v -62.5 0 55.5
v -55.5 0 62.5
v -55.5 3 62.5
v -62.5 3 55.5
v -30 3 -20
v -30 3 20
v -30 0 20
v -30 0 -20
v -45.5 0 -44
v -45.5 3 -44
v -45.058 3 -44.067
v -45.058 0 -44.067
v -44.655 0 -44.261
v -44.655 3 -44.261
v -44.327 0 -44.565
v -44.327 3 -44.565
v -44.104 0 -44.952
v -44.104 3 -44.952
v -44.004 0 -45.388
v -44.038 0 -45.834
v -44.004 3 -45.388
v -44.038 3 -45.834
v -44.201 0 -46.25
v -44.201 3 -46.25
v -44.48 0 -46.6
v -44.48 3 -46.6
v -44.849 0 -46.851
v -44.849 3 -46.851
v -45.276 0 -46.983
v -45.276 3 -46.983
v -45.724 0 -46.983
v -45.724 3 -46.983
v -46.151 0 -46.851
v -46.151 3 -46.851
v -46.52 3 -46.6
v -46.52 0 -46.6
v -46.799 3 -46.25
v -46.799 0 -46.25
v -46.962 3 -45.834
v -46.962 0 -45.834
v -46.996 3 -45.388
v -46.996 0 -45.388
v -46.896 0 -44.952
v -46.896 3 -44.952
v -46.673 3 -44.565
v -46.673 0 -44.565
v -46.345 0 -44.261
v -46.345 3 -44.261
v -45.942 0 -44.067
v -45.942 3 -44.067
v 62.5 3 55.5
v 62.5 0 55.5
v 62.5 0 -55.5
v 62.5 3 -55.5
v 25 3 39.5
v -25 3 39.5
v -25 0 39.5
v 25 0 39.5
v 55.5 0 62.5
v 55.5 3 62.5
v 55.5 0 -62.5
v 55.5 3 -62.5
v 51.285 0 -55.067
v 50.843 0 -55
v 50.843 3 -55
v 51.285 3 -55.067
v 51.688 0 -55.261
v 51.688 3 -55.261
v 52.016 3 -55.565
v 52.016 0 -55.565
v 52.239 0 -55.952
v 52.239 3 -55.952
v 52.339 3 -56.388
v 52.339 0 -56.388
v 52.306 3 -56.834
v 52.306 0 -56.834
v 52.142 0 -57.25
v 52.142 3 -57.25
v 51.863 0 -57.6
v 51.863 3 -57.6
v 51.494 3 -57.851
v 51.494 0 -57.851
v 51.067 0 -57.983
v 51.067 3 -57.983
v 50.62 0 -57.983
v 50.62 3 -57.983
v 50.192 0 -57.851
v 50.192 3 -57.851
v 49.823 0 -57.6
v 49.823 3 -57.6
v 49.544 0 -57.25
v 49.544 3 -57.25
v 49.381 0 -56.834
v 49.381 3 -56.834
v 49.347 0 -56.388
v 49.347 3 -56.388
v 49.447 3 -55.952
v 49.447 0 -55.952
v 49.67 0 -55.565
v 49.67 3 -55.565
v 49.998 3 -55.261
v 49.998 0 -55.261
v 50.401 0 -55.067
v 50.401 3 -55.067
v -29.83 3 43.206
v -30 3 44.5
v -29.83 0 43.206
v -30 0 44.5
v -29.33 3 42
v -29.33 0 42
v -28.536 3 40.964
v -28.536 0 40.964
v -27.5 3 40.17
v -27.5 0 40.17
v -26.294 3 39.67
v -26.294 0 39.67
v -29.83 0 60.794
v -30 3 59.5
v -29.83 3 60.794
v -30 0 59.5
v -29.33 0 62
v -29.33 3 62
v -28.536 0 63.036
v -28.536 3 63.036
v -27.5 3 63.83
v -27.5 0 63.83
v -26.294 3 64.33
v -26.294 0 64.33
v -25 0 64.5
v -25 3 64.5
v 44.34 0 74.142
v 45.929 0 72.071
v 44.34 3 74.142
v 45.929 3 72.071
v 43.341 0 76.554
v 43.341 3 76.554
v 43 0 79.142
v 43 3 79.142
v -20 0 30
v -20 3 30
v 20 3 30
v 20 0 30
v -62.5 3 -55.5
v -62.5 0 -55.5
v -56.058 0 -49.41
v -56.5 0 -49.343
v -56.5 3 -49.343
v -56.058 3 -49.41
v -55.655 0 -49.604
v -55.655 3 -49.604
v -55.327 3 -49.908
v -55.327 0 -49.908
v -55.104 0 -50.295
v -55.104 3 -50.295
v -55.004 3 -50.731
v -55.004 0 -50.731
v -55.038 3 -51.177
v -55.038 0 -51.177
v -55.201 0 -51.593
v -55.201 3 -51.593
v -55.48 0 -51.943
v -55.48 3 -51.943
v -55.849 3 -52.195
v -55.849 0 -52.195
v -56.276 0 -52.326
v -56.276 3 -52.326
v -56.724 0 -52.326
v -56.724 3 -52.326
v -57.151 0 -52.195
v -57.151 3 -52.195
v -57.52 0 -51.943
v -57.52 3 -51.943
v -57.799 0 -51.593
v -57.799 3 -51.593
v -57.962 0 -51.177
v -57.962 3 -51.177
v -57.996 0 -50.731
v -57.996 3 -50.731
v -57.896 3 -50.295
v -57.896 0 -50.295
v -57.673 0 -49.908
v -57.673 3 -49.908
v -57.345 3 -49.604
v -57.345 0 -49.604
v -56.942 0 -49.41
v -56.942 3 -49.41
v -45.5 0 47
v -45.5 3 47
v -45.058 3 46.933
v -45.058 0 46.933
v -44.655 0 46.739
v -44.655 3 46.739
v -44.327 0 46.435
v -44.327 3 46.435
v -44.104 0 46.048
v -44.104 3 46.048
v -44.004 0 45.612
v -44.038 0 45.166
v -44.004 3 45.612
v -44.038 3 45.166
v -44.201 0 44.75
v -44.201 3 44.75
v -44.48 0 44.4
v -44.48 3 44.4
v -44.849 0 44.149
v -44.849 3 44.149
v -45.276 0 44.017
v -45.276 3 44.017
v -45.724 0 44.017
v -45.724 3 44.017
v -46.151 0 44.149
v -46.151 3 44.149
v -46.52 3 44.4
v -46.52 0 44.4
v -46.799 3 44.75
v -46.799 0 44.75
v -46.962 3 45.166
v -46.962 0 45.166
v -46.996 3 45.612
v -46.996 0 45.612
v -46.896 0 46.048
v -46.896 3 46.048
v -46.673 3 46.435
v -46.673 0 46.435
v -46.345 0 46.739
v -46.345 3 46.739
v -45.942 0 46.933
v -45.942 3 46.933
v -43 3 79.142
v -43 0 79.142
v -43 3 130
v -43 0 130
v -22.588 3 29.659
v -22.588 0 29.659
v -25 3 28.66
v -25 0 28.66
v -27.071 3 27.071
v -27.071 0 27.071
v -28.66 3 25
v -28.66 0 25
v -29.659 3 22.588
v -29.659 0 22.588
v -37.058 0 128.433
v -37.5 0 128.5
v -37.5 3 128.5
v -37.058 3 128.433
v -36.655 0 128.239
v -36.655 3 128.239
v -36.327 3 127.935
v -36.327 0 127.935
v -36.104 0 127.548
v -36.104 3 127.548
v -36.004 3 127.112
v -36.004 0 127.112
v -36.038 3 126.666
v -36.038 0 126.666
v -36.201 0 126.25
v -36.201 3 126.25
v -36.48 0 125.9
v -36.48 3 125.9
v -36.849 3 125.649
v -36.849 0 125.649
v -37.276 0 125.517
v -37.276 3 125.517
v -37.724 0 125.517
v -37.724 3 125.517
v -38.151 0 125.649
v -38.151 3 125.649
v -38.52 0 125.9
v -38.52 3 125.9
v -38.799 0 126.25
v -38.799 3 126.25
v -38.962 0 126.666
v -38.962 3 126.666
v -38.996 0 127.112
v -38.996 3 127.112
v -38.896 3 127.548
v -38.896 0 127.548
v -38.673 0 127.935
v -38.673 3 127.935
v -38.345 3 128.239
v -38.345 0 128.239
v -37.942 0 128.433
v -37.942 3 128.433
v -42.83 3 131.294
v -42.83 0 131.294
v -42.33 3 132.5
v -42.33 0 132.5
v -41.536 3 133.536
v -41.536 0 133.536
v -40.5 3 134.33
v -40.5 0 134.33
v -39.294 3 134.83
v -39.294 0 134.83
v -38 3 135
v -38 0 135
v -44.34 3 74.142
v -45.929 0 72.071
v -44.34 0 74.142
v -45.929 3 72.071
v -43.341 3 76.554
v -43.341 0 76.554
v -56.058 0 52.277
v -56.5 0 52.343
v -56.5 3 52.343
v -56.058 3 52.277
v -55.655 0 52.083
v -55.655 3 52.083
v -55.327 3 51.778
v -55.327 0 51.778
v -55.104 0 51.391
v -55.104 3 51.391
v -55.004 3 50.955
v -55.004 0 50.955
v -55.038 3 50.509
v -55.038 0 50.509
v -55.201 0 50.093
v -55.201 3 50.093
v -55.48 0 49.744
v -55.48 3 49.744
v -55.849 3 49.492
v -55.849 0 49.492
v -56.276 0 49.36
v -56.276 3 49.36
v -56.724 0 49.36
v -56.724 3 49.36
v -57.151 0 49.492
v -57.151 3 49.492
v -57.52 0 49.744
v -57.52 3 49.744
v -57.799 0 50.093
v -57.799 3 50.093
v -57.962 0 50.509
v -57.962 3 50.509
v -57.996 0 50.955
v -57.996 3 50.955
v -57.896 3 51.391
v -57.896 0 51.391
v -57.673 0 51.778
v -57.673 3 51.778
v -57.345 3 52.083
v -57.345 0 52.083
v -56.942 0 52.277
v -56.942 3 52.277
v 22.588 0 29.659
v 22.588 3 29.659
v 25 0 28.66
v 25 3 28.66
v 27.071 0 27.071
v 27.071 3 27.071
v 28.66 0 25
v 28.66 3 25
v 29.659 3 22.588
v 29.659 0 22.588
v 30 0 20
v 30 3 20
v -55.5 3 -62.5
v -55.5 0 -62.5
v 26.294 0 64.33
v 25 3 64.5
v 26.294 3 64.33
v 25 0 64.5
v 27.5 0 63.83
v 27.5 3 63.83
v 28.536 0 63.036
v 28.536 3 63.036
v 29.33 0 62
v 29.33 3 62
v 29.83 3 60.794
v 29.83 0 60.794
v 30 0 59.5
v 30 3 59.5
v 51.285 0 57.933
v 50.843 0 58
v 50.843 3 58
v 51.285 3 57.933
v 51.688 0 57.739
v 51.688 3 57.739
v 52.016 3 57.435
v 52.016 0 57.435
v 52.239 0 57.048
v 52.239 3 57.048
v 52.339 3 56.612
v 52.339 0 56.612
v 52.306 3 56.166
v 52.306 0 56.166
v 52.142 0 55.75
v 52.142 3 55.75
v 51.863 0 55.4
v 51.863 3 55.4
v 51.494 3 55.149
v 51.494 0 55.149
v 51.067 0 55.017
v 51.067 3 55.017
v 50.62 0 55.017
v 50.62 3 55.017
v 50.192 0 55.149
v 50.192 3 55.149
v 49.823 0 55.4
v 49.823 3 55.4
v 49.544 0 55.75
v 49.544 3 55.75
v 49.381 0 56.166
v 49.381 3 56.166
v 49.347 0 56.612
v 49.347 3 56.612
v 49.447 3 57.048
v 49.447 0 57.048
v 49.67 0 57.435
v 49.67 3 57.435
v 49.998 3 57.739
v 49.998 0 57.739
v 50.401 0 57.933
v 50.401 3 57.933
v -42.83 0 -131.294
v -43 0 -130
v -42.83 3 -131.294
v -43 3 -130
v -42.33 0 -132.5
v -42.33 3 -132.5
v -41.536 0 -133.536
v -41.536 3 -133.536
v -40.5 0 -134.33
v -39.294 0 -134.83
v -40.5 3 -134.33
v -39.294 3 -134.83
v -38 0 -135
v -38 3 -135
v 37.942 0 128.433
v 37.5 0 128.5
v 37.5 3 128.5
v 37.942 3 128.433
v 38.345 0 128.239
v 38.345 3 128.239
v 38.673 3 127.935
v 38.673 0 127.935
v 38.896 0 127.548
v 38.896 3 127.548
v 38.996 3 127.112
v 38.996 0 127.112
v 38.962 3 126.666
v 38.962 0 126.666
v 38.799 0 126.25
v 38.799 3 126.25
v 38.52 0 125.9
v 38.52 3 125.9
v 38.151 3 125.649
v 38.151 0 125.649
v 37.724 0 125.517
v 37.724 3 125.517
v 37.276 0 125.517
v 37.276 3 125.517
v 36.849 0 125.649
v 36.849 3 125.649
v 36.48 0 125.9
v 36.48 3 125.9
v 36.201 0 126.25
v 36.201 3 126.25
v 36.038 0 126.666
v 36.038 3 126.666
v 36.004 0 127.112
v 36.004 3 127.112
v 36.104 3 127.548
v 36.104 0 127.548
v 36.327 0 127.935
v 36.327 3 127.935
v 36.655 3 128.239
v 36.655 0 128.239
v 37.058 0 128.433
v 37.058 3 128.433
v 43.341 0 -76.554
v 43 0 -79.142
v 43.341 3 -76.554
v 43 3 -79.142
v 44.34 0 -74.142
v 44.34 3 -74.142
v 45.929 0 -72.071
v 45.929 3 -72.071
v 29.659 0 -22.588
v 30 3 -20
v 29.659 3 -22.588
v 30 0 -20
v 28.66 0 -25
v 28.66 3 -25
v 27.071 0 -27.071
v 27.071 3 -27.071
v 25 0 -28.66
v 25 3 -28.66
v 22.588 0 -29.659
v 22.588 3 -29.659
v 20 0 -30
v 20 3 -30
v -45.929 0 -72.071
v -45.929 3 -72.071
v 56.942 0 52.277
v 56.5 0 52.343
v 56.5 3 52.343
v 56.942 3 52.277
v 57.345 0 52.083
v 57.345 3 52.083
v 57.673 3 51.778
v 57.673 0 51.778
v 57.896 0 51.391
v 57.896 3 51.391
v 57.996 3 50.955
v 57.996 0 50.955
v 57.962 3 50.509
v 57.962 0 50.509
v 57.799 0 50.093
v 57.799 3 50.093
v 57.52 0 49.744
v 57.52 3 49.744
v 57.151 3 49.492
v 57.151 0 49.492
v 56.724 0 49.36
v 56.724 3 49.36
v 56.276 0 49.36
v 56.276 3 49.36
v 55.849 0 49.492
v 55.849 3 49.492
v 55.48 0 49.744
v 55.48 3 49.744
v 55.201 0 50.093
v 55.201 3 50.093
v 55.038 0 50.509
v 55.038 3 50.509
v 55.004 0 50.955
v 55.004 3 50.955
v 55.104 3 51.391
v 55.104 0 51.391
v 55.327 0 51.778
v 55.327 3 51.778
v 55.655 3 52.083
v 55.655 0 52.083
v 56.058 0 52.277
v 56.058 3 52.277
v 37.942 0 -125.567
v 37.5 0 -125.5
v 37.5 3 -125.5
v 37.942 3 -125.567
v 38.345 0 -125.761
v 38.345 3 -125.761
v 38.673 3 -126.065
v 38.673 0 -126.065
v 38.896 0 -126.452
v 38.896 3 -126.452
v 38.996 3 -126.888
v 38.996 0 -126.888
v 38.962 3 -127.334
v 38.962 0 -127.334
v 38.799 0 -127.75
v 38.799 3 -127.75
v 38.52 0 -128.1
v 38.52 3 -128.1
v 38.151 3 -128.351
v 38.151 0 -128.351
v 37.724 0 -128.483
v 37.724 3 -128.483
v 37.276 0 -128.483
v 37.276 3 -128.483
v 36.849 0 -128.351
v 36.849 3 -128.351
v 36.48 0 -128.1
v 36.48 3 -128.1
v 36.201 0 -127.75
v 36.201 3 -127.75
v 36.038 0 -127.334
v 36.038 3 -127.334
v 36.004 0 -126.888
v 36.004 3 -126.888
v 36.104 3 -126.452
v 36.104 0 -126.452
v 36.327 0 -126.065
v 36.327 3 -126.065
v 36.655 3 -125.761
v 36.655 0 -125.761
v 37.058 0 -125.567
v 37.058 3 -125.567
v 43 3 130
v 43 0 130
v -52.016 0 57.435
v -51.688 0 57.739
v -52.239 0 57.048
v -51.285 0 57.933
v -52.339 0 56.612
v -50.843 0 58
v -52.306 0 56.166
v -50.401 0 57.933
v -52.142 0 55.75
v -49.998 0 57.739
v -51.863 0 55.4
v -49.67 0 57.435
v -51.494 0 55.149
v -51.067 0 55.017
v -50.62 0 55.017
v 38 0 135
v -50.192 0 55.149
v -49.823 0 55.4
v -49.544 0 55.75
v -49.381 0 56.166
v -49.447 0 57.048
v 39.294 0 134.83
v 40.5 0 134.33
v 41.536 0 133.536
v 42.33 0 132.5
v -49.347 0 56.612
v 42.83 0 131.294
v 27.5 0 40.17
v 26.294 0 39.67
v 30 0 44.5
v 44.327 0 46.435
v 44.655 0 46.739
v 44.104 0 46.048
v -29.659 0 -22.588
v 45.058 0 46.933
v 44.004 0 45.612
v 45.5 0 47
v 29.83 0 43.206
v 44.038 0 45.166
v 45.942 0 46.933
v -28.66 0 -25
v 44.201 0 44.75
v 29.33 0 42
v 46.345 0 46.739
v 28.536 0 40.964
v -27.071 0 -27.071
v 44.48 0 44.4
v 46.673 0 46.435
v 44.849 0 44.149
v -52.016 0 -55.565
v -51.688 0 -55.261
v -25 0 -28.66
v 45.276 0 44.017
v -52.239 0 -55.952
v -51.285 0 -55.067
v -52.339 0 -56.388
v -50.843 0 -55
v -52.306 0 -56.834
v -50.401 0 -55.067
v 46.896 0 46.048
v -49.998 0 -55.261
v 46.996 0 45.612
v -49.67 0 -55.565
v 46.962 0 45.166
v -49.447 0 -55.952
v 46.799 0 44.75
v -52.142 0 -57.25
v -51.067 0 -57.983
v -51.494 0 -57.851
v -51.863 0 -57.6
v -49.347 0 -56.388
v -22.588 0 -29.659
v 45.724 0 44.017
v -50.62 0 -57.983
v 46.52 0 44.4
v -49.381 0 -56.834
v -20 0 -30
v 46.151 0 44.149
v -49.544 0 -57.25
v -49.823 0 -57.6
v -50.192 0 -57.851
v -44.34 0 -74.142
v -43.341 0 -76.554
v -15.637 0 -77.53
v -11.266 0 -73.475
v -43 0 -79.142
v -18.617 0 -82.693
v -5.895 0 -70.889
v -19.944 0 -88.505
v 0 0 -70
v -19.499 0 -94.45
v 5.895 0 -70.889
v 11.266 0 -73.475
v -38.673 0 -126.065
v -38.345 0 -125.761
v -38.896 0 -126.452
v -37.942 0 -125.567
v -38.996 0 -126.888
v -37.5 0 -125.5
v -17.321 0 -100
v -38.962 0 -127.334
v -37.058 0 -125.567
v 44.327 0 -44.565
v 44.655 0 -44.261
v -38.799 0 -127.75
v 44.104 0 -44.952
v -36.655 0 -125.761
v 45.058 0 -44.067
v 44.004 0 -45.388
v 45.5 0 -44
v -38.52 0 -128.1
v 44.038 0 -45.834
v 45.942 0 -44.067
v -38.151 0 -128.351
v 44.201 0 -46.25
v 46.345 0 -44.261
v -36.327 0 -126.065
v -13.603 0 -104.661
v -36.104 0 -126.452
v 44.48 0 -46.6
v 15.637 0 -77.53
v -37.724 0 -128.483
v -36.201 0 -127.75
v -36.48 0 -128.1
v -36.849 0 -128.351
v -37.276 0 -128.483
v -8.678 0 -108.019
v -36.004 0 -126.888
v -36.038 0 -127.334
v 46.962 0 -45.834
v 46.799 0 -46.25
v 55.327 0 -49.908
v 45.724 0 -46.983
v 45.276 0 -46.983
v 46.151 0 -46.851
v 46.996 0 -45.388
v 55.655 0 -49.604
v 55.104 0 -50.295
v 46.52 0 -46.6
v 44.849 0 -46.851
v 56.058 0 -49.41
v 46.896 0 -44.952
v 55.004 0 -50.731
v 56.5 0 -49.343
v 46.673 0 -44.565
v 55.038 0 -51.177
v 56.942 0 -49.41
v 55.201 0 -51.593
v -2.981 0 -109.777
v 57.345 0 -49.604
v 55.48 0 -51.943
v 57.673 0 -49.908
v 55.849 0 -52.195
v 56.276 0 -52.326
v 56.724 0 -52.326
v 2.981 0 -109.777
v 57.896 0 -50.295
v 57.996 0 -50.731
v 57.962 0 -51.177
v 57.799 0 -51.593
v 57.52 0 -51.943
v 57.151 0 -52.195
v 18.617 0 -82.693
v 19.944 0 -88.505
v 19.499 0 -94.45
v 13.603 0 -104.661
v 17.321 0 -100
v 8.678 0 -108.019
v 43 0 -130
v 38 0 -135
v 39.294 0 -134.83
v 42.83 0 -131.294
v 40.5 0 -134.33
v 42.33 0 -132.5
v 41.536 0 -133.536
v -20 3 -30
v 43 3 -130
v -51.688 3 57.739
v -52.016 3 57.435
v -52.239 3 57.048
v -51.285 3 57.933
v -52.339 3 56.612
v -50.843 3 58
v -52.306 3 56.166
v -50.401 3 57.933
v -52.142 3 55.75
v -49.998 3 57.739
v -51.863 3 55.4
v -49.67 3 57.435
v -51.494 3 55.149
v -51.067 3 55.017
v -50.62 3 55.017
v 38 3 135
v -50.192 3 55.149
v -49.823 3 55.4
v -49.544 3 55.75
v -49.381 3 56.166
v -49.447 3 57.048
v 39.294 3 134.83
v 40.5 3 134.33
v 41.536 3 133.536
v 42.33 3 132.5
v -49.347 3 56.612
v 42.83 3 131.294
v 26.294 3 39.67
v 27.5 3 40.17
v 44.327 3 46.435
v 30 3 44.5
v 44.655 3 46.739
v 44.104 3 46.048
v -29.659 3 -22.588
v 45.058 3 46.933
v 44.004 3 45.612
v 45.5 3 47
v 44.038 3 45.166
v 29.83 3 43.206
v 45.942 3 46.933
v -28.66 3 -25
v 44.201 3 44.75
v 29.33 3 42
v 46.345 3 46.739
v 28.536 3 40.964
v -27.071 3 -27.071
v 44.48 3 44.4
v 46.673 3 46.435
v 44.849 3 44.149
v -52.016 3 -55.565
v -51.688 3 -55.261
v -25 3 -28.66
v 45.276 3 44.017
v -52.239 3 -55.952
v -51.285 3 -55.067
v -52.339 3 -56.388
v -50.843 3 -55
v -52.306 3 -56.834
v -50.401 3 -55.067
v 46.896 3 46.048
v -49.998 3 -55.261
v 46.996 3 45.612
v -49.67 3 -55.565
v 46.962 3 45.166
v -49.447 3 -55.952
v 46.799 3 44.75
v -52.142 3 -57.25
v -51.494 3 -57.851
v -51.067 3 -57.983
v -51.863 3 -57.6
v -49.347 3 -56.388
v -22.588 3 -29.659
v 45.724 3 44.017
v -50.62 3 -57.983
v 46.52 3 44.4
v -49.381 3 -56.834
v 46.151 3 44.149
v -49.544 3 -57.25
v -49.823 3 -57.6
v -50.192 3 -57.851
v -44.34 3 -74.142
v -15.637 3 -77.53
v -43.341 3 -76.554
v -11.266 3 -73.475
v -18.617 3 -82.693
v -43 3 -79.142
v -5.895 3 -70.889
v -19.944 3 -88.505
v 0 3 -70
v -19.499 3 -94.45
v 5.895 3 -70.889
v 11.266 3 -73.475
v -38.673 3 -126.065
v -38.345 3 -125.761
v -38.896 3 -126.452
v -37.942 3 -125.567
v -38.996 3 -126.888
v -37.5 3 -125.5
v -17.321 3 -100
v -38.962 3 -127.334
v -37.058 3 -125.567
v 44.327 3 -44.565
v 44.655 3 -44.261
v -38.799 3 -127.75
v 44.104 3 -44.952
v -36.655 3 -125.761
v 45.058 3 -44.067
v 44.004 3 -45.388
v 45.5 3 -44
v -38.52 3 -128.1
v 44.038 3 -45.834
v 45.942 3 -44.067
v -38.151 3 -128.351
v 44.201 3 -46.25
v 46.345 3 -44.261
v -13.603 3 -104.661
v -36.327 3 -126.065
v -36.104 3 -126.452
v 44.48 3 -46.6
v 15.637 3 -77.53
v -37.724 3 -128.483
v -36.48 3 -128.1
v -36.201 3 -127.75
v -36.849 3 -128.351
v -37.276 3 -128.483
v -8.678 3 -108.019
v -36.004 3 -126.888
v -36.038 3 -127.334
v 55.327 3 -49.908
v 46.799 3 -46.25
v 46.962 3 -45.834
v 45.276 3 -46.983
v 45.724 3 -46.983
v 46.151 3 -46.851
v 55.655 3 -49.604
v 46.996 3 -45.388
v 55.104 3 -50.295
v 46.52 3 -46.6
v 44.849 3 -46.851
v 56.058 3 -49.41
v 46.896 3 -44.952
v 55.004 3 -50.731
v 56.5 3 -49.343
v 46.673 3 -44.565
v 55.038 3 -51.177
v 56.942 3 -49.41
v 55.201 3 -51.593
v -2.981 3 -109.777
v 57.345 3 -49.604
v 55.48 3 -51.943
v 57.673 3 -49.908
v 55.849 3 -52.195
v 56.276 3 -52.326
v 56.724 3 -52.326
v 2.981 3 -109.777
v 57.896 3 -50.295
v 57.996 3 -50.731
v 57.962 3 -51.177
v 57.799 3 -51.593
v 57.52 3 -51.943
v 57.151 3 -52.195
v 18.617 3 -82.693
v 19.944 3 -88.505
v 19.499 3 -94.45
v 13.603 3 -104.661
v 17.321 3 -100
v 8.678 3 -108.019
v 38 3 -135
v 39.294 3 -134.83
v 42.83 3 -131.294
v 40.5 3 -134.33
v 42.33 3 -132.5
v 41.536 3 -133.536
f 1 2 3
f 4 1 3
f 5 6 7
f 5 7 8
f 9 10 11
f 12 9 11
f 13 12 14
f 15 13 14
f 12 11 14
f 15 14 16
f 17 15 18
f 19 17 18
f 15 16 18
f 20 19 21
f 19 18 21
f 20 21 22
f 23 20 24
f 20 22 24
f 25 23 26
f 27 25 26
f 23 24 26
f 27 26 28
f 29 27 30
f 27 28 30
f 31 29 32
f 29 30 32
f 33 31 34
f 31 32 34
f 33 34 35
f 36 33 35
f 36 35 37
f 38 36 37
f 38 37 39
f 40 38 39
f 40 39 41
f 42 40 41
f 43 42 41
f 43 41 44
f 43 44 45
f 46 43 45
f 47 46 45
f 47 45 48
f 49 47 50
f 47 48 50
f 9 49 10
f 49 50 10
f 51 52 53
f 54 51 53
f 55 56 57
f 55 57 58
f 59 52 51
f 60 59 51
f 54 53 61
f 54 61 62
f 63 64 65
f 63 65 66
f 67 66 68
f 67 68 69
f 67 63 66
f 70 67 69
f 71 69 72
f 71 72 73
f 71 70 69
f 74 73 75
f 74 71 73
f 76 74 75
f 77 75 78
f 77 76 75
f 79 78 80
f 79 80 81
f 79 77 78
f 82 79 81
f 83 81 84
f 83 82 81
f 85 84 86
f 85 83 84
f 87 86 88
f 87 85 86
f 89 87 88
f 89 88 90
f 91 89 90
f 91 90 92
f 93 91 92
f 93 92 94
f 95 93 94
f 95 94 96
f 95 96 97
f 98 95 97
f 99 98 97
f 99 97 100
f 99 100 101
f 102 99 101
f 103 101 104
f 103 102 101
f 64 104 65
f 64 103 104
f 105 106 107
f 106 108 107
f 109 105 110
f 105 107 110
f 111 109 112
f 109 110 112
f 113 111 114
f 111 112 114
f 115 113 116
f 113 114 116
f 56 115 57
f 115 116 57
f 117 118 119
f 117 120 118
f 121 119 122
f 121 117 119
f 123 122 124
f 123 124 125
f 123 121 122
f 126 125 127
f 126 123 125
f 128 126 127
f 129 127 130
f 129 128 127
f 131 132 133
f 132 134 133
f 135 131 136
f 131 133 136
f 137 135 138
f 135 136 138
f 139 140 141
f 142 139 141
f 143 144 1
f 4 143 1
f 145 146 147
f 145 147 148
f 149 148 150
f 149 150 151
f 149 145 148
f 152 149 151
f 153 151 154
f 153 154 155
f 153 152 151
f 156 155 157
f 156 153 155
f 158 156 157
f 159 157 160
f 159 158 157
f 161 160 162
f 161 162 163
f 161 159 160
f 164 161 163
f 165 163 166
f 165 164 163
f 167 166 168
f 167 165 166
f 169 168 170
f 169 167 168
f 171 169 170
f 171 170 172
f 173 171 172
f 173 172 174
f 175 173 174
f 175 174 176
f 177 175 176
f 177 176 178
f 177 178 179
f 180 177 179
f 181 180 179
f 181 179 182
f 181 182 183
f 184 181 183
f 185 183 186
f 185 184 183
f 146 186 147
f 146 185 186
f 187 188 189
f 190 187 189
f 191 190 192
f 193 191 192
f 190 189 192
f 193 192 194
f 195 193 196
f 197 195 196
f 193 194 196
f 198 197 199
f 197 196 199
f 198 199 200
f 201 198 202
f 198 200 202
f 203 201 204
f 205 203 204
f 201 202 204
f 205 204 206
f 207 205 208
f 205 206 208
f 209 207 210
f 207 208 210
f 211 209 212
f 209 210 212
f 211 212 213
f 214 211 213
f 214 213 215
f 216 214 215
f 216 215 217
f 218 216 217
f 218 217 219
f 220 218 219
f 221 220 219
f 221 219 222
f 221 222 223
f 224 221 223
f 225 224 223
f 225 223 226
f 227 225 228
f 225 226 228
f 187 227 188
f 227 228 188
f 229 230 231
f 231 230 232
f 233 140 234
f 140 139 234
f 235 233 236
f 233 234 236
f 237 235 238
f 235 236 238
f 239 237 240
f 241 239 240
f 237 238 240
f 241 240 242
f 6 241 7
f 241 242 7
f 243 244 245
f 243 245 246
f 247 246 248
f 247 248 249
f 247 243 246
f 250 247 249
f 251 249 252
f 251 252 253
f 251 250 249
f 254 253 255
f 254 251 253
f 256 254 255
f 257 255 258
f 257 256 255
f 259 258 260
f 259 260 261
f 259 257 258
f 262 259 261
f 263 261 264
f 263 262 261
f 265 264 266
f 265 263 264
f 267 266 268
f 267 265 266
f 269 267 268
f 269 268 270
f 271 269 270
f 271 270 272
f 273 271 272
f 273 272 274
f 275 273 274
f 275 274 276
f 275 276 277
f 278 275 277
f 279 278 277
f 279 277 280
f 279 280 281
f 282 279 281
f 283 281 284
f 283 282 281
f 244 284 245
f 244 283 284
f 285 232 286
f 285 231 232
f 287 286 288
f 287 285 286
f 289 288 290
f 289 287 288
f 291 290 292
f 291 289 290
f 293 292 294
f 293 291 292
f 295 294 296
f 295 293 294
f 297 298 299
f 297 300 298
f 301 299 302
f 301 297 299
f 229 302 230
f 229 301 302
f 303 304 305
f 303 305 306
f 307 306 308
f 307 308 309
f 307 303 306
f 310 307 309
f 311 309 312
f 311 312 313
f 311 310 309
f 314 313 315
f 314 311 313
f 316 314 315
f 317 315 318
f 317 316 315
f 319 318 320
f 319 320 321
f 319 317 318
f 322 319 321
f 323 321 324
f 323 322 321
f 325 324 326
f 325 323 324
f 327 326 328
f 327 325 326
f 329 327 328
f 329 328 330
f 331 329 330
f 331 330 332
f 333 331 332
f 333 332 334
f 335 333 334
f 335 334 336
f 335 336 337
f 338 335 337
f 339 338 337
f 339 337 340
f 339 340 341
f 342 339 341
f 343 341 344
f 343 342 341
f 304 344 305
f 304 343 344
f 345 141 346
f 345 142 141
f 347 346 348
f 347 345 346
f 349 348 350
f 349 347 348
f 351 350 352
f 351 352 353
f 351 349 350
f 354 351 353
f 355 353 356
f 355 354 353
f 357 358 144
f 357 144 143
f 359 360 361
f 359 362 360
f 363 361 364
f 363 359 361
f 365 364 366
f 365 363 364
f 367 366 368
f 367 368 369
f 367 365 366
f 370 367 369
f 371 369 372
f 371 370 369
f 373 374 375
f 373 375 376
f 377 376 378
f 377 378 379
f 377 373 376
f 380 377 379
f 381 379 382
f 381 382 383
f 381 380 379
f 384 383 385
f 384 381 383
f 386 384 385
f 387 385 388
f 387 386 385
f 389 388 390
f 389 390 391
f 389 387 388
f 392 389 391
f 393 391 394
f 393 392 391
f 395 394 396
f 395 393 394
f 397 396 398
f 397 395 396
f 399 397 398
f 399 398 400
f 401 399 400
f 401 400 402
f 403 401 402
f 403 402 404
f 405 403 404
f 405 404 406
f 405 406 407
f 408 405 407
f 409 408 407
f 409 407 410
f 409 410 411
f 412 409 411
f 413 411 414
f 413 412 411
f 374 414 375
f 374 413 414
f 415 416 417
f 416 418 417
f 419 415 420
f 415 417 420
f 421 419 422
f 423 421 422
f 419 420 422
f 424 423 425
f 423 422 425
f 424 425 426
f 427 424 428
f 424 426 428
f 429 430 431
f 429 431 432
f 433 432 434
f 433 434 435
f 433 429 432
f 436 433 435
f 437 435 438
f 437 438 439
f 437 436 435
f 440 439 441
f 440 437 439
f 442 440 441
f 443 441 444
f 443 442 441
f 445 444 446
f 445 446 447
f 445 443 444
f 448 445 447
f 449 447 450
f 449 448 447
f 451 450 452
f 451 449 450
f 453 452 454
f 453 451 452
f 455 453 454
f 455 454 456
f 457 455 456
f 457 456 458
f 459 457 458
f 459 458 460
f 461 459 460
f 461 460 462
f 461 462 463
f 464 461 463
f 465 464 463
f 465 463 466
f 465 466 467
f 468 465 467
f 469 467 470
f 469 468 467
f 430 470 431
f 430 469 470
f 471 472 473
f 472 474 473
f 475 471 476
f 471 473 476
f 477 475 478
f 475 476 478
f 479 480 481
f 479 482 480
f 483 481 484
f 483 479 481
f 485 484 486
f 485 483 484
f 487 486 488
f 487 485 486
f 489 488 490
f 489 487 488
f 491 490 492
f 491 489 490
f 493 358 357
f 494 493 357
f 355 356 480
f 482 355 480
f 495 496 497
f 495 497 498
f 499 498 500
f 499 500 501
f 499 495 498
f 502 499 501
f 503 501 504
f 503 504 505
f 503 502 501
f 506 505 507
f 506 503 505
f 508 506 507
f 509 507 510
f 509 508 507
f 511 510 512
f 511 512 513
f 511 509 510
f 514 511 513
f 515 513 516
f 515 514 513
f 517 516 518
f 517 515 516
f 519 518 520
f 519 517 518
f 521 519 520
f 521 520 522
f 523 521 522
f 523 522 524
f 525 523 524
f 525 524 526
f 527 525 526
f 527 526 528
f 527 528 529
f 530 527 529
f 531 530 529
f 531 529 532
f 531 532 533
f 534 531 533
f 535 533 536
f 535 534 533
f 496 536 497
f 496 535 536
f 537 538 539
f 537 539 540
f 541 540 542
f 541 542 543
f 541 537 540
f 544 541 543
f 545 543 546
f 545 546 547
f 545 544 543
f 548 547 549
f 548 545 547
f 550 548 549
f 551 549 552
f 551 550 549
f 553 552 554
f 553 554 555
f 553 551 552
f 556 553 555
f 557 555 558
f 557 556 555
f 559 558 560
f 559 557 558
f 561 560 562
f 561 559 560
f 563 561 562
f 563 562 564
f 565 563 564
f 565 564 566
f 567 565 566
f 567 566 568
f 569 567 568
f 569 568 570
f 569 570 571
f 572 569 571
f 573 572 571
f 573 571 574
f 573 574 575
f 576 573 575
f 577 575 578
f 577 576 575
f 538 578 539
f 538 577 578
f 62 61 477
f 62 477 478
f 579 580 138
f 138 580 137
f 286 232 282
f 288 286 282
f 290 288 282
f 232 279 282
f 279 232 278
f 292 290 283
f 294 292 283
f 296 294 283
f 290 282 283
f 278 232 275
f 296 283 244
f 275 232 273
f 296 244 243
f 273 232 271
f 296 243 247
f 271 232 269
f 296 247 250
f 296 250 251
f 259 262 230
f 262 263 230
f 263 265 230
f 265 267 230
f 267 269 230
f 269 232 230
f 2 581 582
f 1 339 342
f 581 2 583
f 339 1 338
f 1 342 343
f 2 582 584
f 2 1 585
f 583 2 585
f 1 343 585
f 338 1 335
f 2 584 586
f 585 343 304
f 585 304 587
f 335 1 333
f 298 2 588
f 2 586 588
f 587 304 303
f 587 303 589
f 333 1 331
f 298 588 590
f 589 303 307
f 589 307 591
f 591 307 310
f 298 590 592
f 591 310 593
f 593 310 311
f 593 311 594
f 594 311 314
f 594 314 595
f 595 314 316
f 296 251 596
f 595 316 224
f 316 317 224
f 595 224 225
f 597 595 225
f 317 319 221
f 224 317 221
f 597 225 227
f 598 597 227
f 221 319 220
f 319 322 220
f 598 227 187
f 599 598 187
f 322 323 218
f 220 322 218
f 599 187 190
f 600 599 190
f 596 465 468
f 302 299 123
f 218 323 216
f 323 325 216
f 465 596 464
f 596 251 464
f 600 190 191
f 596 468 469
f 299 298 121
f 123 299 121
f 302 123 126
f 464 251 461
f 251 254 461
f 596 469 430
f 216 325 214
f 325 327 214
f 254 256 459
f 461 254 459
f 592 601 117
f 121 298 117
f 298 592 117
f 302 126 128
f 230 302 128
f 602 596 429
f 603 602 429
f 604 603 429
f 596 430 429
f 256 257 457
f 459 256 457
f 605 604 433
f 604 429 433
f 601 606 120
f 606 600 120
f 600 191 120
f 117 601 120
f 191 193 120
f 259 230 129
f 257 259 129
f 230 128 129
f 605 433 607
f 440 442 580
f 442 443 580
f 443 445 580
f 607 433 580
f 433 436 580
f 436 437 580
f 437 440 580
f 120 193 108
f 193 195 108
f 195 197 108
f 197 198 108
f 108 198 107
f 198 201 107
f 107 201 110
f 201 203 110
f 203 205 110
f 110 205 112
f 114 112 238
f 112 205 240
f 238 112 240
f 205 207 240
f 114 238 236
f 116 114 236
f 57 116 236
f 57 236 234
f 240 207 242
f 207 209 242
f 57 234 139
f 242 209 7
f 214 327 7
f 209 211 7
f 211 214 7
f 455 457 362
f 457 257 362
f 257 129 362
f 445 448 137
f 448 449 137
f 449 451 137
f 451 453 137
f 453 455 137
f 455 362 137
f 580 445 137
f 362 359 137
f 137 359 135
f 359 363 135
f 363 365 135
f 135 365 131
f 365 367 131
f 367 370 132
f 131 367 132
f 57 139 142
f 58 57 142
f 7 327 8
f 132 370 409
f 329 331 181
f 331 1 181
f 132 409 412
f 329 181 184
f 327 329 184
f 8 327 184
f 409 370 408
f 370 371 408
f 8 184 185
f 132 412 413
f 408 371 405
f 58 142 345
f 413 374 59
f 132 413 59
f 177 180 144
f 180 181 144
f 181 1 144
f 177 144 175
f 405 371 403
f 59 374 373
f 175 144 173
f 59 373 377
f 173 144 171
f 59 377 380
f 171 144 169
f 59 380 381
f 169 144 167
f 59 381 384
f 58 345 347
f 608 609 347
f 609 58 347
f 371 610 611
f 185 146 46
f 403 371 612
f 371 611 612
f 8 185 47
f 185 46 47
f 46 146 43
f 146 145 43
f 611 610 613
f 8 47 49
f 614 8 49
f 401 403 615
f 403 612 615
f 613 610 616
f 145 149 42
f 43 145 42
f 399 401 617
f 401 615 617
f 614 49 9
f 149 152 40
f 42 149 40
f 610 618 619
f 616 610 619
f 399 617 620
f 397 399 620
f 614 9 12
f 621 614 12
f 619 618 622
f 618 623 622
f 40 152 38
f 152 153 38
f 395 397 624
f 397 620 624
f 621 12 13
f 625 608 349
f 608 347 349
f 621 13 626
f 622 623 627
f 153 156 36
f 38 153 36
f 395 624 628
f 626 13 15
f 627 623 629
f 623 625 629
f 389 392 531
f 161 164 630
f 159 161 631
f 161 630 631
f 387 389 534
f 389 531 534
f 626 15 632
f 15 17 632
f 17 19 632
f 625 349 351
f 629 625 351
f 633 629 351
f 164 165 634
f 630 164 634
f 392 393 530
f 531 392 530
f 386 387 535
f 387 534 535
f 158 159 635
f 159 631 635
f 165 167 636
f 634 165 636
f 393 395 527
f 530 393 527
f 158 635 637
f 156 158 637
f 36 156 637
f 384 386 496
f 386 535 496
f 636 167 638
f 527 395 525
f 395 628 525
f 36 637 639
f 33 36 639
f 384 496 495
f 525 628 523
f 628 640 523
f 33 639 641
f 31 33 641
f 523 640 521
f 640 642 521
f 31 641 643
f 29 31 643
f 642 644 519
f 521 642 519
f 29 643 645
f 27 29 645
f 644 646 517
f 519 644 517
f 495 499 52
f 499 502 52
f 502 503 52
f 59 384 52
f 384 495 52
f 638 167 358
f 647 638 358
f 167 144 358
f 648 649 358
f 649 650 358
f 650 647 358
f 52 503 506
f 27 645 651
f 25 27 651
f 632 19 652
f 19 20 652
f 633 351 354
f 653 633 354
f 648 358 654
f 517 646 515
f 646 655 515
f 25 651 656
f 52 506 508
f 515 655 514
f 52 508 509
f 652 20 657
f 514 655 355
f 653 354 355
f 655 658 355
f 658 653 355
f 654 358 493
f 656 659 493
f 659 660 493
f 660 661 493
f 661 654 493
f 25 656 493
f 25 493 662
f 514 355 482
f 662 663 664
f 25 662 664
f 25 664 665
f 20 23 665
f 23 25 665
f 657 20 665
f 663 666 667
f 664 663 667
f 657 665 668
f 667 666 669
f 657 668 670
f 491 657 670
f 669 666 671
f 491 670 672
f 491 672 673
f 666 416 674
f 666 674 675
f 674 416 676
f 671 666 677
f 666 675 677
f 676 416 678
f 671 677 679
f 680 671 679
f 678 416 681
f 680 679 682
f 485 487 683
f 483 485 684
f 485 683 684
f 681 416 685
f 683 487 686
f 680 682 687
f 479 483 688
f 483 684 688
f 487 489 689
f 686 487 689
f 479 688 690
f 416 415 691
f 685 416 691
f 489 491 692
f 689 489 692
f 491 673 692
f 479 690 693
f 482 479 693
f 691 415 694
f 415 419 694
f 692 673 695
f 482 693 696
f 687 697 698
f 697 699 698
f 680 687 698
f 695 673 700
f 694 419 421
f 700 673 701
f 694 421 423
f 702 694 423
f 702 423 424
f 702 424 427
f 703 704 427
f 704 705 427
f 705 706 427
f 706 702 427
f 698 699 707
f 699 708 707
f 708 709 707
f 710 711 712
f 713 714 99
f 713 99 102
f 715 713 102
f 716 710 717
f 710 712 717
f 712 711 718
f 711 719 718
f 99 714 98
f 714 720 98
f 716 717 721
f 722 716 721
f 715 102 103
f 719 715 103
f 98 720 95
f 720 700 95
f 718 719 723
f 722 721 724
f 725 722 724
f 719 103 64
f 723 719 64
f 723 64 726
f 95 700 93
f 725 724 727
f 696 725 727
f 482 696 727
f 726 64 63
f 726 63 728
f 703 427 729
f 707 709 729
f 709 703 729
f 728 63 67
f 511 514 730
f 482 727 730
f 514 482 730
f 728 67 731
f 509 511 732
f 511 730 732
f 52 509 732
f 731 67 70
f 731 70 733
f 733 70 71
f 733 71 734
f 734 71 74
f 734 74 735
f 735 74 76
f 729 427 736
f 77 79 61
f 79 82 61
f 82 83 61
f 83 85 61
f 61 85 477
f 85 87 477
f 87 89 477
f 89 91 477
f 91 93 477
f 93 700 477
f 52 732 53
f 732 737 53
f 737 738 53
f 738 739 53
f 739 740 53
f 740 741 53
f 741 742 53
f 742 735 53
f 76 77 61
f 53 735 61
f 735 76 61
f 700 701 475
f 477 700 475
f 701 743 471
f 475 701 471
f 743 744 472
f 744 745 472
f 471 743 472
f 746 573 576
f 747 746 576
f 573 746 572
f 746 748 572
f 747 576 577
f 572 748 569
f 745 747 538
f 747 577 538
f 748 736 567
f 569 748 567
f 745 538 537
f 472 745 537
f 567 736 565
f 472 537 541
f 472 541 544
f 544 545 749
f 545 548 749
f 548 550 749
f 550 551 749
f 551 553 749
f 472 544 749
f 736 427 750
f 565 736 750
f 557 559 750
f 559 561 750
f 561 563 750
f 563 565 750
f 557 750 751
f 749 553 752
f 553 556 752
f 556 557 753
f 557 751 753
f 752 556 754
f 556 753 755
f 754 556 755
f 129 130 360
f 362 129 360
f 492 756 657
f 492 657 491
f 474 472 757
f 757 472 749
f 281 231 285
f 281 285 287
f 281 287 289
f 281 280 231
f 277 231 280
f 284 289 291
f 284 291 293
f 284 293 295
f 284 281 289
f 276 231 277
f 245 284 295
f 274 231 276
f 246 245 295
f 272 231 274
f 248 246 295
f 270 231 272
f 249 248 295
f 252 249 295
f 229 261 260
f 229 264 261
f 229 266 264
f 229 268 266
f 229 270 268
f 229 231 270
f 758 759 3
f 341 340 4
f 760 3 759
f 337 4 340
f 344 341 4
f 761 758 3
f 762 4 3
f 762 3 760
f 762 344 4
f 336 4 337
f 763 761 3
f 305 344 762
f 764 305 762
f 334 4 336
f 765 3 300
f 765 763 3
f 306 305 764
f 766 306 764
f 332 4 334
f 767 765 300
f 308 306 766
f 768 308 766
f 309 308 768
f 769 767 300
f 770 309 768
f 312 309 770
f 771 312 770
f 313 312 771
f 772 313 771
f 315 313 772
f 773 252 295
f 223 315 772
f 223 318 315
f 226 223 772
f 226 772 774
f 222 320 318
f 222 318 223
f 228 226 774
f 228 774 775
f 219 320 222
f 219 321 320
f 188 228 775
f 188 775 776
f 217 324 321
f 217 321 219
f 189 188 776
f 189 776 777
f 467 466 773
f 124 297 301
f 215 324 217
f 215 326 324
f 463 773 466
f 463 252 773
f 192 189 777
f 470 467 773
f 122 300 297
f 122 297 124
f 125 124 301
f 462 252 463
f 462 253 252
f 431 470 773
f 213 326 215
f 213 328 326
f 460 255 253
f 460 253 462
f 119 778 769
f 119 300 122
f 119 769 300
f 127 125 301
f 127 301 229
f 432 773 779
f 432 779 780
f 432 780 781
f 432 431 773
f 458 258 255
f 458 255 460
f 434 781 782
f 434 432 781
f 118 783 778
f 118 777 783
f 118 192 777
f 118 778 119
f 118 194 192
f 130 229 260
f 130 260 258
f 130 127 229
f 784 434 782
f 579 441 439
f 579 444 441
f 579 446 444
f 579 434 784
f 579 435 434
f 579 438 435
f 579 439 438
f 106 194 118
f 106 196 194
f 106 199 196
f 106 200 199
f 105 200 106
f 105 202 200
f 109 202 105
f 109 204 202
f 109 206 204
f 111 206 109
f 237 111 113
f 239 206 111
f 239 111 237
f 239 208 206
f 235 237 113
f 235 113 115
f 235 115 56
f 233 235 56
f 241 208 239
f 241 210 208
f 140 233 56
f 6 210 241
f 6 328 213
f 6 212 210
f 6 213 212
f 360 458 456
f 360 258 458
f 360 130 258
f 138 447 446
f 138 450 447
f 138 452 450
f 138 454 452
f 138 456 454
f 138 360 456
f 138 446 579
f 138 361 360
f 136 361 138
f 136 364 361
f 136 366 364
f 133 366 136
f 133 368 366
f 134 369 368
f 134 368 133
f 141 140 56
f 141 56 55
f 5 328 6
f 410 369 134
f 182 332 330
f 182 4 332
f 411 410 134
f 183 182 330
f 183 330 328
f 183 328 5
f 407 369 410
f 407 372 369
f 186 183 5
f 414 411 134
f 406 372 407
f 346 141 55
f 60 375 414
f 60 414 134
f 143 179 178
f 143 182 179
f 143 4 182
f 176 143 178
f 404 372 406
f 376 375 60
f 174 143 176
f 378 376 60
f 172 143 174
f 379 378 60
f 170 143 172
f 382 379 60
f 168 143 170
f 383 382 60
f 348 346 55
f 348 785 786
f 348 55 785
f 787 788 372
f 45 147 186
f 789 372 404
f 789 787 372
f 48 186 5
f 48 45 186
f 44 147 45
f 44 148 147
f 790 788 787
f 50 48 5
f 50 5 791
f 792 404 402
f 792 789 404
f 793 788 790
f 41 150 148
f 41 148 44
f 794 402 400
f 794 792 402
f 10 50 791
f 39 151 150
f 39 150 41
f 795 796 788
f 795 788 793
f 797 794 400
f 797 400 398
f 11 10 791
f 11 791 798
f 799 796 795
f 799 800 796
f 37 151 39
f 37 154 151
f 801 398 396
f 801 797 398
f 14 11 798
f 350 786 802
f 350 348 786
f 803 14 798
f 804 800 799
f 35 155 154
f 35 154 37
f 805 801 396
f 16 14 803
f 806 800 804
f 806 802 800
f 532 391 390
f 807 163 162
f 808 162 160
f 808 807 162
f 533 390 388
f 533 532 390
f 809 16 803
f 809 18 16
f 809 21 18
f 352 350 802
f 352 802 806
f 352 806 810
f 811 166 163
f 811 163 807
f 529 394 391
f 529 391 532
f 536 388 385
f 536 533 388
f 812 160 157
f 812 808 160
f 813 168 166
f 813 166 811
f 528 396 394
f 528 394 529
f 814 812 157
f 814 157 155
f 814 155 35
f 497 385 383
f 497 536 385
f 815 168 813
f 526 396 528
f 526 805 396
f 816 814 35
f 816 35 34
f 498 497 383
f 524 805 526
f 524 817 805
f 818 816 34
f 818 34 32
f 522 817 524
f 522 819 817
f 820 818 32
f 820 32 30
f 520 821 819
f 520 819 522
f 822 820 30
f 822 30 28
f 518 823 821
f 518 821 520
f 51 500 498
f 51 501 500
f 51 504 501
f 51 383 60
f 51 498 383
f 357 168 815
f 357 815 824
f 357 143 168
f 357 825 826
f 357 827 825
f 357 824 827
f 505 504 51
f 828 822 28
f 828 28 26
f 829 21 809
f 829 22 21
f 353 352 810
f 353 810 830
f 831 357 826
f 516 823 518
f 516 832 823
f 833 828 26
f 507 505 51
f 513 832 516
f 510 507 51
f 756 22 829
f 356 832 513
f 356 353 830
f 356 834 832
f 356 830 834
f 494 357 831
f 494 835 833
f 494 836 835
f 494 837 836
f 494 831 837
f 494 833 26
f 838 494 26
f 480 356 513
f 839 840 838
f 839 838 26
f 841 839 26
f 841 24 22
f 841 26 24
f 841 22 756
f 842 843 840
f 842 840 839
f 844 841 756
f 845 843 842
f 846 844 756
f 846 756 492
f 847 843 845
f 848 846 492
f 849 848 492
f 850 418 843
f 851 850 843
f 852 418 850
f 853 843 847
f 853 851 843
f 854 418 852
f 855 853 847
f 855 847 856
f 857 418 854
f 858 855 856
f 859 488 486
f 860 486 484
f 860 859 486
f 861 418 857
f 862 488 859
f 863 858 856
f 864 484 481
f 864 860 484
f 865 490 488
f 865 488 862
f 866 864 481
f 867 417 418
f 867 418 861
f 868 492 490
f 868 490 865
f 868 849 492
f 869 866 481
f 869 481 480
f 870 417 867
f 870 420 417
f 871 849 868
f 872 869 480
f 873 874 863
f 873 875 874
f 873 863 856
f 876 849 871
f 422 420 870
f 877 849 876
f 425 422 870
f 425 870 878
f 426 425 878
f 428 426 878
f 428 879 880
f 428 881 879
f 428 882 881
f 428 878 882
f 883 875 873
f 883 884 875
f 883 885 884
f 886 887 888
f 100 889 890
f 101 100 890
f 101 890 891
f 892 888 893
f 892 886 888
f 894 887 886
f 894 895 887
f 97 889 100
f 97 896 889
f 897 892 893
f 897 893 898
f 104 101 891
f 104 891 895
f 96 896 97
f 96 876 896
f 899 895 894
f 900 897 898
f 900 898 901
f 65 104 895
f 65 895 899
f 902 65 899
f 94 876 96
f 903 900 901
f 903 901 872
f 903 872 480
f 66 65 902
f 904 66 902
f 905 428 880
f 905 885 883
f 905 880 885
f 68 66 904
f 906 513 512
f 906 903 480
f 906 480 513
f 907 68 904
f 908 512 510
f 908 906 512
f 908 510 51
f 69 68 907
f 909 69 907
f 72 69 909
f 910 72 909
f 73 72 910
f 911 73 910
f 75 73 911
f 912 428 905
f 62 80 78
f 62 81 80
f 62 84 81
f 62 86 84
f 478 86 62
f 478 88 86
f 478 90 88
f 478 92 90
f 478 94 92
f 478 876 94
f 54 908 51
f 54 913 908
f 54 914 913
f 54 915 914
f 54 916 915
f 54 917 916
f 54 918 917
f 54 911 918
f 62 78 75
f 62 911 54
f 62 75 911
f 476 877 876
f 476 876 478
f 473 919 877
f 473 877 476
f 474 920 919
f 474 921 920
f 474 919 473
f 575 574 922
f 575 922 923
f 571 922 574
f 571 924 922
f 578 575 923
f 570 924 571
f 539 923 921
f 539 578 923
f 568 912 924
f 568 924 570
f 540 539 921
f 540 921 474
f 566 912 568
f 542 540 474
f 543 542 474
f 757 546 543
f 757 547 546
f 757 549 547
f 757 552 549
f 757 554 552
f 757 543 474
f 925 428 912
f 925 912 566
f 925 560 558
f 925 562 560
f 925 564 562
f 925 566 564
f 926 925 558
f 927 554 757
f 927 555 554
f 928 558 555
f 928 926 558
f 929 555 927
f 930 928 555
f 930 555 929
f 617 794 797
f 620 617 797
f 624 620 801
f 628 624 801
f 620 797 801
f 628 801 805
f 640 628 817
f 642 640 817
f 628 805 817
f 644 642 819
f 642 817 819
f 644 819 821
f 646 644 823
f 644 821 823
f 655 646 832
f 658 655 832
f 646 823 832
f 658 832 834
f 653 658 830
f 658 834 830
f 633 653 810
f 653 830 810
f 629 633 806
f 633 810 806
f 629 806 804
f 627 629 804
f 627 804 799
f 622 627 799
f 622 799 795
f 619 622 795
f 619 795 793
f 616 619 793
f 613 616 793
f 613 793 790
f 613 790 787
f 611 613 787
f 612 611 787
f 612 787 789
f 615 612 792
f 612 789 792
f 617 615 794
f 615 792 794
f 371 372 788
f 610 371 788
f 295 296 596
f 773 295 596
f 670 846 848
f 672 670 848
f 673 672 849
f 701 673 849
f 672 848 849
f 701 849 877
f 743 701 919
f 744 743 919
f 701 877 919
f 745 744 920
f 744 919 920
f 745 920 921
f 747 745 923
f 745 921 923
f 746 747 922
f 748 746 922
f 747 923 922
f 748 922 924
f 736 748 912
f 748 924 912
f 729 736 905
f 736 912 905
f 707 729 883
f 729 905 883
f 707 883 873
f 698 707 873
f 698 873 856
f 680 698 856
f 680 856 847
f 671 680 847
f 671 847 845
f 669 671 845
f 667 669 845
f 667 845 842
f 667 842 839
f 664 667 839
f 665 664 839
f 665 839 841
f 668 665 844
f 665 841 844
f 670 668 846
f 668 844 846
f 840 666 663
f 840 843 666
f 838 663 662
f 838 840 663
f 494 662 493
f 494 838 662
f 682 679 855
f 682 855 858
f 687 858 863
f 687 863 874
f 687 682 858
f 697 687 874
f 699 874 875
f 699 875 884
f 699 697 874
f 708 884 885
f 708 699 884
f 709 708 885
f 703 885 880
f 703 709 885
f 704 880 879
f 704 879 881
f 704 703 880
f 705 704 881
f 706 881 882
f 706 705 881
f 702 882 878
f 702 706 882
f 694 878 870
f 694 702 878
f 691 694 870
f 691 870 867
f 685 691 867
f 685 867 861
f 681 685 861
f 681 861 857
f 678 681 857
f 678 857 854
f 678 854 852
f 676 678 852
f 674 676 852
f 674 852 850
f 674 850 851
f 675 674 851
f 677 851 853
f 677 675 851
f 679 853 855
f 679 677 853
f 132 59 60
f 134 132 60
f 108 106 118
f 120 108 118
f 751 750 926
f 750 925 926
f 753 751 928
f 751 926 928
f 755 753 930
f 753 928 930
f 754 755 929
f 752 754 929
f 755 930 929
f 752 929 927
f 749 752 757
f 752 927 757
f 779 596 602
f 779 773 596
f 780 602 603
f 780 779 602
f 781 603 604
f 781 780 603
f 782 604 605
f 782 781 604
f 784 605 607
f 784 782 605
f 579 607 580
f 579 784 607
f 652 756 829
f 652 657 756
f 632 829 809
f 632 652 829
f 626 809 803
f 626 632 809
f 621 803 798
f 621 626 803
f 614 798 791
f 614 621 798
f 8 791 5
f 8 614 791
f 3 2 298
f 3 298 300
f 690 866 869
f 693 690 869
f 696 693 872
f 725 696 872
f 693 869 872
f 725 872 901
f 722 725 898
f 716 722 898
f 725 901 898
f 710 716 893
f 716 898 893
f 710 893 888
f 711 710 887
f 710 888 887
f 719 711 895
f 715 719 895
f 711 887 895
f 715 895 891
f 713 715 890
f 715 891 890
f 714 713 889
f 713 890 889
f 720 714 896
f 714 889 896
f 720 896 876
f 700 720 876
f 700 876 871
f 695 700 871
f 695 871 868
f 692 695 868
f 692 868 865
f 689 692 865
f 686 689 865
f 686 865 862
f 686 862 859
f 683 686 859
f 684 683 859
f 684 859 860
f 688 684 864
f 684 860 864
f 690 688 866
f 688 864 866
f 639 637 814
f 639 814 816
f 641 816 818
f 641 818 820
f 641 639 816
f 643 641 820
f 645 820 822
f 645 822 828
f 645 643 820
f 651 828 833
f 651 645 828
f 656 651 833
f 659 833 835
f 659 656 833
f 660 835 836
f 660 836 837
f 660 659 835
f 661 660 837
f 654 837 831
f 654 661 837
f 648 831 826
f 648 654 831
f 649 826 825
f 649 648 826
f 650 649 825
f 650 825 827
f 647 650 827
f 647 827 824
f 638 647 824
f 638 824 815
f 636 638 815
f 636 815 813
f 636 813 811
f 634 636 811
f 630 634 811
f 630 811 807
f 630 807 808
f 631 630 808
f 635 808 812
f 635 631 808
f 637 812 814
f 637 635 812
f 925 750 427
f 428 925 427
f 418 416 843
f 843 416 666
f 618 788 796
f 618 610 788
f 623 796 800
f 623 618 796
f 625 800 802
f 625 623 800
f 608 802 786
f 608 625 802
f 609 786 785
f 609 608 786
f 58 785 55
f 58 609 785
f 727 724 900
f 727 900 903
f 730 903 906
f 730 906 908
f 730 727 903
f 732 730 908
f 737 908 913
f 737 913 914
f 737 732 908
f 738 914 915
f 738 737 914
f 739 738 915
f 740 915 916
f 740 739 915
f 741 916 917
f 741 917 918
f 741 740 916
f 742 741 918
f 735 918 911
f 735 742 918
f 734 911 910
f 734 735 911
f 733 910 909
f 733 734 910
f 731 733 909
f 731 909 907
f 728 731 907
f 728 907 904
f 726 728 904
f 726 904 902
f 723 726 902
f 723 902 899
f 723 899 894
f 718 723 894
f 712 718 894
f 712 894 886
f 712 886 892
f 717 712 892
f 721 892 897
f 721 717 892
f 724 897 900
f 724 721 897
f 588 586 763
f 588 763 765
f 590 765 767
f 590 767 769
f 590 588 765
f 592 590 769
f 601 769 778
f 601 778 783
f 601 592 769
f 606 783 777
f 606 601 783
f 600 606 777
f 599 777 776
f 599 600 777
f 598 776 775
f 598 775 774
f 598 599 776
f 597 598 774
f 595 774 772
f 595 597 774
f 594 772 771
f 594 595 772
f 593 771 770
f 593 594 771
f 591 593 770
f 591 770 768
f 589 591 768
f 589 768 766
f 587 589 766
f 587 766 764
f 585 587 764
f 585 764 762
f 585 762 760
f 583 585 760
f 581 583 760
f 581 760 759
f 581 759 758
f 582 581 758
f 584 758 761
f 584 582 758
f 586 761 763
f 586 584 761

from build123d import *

# Parameters (mm, degrees)
SKETCH_1_R          = 1.5
EXTRUDE_1_DEPTH     = 3
CHAMFER_1_SIZE      = 7
SKETCH_3_W          = 60
SKETCH_3_H          = 60
SKETCH_3_R          = 1.5
SKETCH_3_R_2        = 20
SKETCH_3_H_2        = 10
SKETCH_3_H_3        = 5
CUT_EXTRUDE_1_DEPTH = 3
FILLET_3_R          = 10
FILLET_4_R          = 5
FILLET_5_R          = 5
CHAMFER_2_SIZE      = 12.5
FILLET_6_R          = 10


with BuildPart() as part:
    # 草图1 → 凸台-拉伸1 (new body)
    with BuildSketch(Plane(origin=(0, 0, 0), x_dir=(1, 0, 0), z_dir=(0, 1, 0))):
        Polygon((-62.5, 62.5), (-62.5, -62.5), (-43, -62.5), (-43, -135), (43, -135), (43, -62.5), (62.5, -62.5), (62.5, 62.5), (43, 62.5), (43, 135), (-43, 135), (-43, 62.5), align=None)
        with Locations(Location((-56.5, -50.843145751, 0), (0, 0, 270))):
            Circle(SKETCH_1_R, mode=Mode.SUBTRACT)
        with Locations(Location((-50.843145751, -56.5, 0), (0, 0, 270))):
            Circle(SKETCH_1_R, mode=Mode.SUBTRACT)
        with Locations(Location((50.843145751, -56.5, 0), (0, 0, 270))):
            Circle(SKETCH_1_R, mode=Mode.SUBTRACT)
        with Locations(Location((56.5, -50.843145751, 0), (0, 0, 270))):
            Circle(SKETCH_1_R, mode=Mode.SUBTRACT)
        with Locations(Location((-56.5, 50.843145751, 0), (0, 0, 270))):
            Circle(SKETCH_1_R, mode=Mode.SUBTRACT)
        with Locations(Location((-50.843145751, 56.5, 0), (0, 0, 270))):
            Circle(SKETCH_1_R, mode=Mode.SUBTRACT)
        with Locations(Location((50.843145751, 56.5, 0), (0, 0, 270))):
            Circle(SKETCH_1_R, mode=Mode.SUBTRACT)
        with Locations(Location((56.5, 50.843145751, 0), (0, 0, 270))):
            Circle(SKETCH_1_R, mode=Mode.SUBTRACT)
        with Locations(Location((37.5, -127, 0), (0, 0, 270))):
            Circle(SKETCH_1_R, mode=Mode.SUBTRACT)
        with Locations(Location((-37.5, -127, 0), (0, 0, 270))):
            Circle(SKETCH_1_R, mode=Mode.SUBTRACT)
        with Locations(Location((37.5, 127, 0), (0, 0, 270))):
            Circle(SKETCH_1_R, mode=Mode.SUBTRACT)
        with Locations(Location((-37.5, 127, 0), (0, 0, 270))):
            Circle(SKETCH_1_R, mode=Mode.SUBTRACT)
    extrude(amount=EXTRUDE_1_DEPTH)

    # 倒角1
    chamfer_1_edges = [part.edges().sort_by_distance(p)[0] for p in [
        (-62.5, 1.5, 62.5),
        (-62.5, 1.5, -62.5),
        (62.5, 1.5, -62.5),
        (62.5, 1.5, 62.5),
    ]]
    chamfer(chamfer_1_edges, length=CHAMFER_1_SIZE)

    # 草图3 → 切除-拉伸1 (cut)
    with BuildSketch(Plane(origin=(0, 3, 0), x_dir=(1, 0, 0), z_dir=(0, 1, 0))):
        Rectangle(SKETCH_3_W, SKETCH_3_H)
        with Locations(Location((-45.5, 45.5, 0), (0, 0, 270))):
            Circle(SKETCH_3_R)
        with Locations(Location((45.5, 45.5, 0), (0, 0, 270))):
            Circle(SKETCH_3_R)
        with Locations(Location((45.5, -45.5, 0), (0, 0, 270))):
            Circle(SKETCH_3_R)
        with Locations(Location((-45.5, -45.5, 0), (0, 0, 270))):
            Circle(SKETCH_3_R)
        with Locations(Location((0, 90, 0), (0, 0, 270))):
            Circle(SKETCH_3_R_2)
        with Locations((0, -44.5)):
            Rectangle(SKETCH_3_W, SKETCH_3_H_2)
        with Locations((0, -54.5)):
            Rectangle(SKETCH_3_W, SKETCH_3_H_2)
        with Locations((0, -62)):
            Rectangle(SKETCH_3_W, SKETCH_3_H_3)
    extrude(amount=-CUT_EXTRUDE_1_DEPTH, mode=Mode.SUBTRACT)

    # 圆角3
    fillet_3_edges = [part.edges().sort_by_distance(p)[0] for p in [
        (30, 1.5, 30),
        (-30, 1.5, 30),
        (-30, 1.5, -30),
        (30, 1.5, -30),
    ]]
    fillet(fillet_3_edges, radius=FILLET_3_R)

    # 圆角4
    fillet_4_edges = [part.edges().sort_by_distance(p)[0] for p in [
        (-43, 1.5, -135),
        (43, 1.5, -135),
        (43, 1.5, 135),
        (-43, 1.5, 135),
    ]]
    fillet(fillet_4_edges, radius=FILLET_4_R)

    # 圆角5
    fillet_5_edges = [part.edges().sort_by_distance(p)[0] for p in [
        (30, 1.5, 39.5),
        (30, 1.5, 64.5),
        (-30, 1.5, 64.5),
        (-30, 1.5, 39.5),
    ]]
    fillet(fillet_5_edges, radius=FILLET_5_R)

    # 倒角2
    chamfer_2_edges = [part.edges().sort_by_distance(p)[0] for p in [
        (43, 1.5, -62.5),
        (-43, 1.5, -62.5),
        (43, 1.5, 62.5),
        (-43, 1.5, 62.5),
    ]]
    chamfer(chamfer_2_edges, length=CHAMFER_2_SIZE - 0.0001)  # a hair under: the kernel refuses the full size

    # 圆角6
    fillet_6_edges = [part.edges().sort_by_distance(p)[0] for p in [
        (43, 1.5, -74.9999),
        (-43, 1.5, -74.9999),
        (43, 1.5, 74.9999),
        (-43, 1.5, 74.9999),
    ]]
    fillet(fillet_6_edges, radius=FILLET_6_R)


solid = part.part
